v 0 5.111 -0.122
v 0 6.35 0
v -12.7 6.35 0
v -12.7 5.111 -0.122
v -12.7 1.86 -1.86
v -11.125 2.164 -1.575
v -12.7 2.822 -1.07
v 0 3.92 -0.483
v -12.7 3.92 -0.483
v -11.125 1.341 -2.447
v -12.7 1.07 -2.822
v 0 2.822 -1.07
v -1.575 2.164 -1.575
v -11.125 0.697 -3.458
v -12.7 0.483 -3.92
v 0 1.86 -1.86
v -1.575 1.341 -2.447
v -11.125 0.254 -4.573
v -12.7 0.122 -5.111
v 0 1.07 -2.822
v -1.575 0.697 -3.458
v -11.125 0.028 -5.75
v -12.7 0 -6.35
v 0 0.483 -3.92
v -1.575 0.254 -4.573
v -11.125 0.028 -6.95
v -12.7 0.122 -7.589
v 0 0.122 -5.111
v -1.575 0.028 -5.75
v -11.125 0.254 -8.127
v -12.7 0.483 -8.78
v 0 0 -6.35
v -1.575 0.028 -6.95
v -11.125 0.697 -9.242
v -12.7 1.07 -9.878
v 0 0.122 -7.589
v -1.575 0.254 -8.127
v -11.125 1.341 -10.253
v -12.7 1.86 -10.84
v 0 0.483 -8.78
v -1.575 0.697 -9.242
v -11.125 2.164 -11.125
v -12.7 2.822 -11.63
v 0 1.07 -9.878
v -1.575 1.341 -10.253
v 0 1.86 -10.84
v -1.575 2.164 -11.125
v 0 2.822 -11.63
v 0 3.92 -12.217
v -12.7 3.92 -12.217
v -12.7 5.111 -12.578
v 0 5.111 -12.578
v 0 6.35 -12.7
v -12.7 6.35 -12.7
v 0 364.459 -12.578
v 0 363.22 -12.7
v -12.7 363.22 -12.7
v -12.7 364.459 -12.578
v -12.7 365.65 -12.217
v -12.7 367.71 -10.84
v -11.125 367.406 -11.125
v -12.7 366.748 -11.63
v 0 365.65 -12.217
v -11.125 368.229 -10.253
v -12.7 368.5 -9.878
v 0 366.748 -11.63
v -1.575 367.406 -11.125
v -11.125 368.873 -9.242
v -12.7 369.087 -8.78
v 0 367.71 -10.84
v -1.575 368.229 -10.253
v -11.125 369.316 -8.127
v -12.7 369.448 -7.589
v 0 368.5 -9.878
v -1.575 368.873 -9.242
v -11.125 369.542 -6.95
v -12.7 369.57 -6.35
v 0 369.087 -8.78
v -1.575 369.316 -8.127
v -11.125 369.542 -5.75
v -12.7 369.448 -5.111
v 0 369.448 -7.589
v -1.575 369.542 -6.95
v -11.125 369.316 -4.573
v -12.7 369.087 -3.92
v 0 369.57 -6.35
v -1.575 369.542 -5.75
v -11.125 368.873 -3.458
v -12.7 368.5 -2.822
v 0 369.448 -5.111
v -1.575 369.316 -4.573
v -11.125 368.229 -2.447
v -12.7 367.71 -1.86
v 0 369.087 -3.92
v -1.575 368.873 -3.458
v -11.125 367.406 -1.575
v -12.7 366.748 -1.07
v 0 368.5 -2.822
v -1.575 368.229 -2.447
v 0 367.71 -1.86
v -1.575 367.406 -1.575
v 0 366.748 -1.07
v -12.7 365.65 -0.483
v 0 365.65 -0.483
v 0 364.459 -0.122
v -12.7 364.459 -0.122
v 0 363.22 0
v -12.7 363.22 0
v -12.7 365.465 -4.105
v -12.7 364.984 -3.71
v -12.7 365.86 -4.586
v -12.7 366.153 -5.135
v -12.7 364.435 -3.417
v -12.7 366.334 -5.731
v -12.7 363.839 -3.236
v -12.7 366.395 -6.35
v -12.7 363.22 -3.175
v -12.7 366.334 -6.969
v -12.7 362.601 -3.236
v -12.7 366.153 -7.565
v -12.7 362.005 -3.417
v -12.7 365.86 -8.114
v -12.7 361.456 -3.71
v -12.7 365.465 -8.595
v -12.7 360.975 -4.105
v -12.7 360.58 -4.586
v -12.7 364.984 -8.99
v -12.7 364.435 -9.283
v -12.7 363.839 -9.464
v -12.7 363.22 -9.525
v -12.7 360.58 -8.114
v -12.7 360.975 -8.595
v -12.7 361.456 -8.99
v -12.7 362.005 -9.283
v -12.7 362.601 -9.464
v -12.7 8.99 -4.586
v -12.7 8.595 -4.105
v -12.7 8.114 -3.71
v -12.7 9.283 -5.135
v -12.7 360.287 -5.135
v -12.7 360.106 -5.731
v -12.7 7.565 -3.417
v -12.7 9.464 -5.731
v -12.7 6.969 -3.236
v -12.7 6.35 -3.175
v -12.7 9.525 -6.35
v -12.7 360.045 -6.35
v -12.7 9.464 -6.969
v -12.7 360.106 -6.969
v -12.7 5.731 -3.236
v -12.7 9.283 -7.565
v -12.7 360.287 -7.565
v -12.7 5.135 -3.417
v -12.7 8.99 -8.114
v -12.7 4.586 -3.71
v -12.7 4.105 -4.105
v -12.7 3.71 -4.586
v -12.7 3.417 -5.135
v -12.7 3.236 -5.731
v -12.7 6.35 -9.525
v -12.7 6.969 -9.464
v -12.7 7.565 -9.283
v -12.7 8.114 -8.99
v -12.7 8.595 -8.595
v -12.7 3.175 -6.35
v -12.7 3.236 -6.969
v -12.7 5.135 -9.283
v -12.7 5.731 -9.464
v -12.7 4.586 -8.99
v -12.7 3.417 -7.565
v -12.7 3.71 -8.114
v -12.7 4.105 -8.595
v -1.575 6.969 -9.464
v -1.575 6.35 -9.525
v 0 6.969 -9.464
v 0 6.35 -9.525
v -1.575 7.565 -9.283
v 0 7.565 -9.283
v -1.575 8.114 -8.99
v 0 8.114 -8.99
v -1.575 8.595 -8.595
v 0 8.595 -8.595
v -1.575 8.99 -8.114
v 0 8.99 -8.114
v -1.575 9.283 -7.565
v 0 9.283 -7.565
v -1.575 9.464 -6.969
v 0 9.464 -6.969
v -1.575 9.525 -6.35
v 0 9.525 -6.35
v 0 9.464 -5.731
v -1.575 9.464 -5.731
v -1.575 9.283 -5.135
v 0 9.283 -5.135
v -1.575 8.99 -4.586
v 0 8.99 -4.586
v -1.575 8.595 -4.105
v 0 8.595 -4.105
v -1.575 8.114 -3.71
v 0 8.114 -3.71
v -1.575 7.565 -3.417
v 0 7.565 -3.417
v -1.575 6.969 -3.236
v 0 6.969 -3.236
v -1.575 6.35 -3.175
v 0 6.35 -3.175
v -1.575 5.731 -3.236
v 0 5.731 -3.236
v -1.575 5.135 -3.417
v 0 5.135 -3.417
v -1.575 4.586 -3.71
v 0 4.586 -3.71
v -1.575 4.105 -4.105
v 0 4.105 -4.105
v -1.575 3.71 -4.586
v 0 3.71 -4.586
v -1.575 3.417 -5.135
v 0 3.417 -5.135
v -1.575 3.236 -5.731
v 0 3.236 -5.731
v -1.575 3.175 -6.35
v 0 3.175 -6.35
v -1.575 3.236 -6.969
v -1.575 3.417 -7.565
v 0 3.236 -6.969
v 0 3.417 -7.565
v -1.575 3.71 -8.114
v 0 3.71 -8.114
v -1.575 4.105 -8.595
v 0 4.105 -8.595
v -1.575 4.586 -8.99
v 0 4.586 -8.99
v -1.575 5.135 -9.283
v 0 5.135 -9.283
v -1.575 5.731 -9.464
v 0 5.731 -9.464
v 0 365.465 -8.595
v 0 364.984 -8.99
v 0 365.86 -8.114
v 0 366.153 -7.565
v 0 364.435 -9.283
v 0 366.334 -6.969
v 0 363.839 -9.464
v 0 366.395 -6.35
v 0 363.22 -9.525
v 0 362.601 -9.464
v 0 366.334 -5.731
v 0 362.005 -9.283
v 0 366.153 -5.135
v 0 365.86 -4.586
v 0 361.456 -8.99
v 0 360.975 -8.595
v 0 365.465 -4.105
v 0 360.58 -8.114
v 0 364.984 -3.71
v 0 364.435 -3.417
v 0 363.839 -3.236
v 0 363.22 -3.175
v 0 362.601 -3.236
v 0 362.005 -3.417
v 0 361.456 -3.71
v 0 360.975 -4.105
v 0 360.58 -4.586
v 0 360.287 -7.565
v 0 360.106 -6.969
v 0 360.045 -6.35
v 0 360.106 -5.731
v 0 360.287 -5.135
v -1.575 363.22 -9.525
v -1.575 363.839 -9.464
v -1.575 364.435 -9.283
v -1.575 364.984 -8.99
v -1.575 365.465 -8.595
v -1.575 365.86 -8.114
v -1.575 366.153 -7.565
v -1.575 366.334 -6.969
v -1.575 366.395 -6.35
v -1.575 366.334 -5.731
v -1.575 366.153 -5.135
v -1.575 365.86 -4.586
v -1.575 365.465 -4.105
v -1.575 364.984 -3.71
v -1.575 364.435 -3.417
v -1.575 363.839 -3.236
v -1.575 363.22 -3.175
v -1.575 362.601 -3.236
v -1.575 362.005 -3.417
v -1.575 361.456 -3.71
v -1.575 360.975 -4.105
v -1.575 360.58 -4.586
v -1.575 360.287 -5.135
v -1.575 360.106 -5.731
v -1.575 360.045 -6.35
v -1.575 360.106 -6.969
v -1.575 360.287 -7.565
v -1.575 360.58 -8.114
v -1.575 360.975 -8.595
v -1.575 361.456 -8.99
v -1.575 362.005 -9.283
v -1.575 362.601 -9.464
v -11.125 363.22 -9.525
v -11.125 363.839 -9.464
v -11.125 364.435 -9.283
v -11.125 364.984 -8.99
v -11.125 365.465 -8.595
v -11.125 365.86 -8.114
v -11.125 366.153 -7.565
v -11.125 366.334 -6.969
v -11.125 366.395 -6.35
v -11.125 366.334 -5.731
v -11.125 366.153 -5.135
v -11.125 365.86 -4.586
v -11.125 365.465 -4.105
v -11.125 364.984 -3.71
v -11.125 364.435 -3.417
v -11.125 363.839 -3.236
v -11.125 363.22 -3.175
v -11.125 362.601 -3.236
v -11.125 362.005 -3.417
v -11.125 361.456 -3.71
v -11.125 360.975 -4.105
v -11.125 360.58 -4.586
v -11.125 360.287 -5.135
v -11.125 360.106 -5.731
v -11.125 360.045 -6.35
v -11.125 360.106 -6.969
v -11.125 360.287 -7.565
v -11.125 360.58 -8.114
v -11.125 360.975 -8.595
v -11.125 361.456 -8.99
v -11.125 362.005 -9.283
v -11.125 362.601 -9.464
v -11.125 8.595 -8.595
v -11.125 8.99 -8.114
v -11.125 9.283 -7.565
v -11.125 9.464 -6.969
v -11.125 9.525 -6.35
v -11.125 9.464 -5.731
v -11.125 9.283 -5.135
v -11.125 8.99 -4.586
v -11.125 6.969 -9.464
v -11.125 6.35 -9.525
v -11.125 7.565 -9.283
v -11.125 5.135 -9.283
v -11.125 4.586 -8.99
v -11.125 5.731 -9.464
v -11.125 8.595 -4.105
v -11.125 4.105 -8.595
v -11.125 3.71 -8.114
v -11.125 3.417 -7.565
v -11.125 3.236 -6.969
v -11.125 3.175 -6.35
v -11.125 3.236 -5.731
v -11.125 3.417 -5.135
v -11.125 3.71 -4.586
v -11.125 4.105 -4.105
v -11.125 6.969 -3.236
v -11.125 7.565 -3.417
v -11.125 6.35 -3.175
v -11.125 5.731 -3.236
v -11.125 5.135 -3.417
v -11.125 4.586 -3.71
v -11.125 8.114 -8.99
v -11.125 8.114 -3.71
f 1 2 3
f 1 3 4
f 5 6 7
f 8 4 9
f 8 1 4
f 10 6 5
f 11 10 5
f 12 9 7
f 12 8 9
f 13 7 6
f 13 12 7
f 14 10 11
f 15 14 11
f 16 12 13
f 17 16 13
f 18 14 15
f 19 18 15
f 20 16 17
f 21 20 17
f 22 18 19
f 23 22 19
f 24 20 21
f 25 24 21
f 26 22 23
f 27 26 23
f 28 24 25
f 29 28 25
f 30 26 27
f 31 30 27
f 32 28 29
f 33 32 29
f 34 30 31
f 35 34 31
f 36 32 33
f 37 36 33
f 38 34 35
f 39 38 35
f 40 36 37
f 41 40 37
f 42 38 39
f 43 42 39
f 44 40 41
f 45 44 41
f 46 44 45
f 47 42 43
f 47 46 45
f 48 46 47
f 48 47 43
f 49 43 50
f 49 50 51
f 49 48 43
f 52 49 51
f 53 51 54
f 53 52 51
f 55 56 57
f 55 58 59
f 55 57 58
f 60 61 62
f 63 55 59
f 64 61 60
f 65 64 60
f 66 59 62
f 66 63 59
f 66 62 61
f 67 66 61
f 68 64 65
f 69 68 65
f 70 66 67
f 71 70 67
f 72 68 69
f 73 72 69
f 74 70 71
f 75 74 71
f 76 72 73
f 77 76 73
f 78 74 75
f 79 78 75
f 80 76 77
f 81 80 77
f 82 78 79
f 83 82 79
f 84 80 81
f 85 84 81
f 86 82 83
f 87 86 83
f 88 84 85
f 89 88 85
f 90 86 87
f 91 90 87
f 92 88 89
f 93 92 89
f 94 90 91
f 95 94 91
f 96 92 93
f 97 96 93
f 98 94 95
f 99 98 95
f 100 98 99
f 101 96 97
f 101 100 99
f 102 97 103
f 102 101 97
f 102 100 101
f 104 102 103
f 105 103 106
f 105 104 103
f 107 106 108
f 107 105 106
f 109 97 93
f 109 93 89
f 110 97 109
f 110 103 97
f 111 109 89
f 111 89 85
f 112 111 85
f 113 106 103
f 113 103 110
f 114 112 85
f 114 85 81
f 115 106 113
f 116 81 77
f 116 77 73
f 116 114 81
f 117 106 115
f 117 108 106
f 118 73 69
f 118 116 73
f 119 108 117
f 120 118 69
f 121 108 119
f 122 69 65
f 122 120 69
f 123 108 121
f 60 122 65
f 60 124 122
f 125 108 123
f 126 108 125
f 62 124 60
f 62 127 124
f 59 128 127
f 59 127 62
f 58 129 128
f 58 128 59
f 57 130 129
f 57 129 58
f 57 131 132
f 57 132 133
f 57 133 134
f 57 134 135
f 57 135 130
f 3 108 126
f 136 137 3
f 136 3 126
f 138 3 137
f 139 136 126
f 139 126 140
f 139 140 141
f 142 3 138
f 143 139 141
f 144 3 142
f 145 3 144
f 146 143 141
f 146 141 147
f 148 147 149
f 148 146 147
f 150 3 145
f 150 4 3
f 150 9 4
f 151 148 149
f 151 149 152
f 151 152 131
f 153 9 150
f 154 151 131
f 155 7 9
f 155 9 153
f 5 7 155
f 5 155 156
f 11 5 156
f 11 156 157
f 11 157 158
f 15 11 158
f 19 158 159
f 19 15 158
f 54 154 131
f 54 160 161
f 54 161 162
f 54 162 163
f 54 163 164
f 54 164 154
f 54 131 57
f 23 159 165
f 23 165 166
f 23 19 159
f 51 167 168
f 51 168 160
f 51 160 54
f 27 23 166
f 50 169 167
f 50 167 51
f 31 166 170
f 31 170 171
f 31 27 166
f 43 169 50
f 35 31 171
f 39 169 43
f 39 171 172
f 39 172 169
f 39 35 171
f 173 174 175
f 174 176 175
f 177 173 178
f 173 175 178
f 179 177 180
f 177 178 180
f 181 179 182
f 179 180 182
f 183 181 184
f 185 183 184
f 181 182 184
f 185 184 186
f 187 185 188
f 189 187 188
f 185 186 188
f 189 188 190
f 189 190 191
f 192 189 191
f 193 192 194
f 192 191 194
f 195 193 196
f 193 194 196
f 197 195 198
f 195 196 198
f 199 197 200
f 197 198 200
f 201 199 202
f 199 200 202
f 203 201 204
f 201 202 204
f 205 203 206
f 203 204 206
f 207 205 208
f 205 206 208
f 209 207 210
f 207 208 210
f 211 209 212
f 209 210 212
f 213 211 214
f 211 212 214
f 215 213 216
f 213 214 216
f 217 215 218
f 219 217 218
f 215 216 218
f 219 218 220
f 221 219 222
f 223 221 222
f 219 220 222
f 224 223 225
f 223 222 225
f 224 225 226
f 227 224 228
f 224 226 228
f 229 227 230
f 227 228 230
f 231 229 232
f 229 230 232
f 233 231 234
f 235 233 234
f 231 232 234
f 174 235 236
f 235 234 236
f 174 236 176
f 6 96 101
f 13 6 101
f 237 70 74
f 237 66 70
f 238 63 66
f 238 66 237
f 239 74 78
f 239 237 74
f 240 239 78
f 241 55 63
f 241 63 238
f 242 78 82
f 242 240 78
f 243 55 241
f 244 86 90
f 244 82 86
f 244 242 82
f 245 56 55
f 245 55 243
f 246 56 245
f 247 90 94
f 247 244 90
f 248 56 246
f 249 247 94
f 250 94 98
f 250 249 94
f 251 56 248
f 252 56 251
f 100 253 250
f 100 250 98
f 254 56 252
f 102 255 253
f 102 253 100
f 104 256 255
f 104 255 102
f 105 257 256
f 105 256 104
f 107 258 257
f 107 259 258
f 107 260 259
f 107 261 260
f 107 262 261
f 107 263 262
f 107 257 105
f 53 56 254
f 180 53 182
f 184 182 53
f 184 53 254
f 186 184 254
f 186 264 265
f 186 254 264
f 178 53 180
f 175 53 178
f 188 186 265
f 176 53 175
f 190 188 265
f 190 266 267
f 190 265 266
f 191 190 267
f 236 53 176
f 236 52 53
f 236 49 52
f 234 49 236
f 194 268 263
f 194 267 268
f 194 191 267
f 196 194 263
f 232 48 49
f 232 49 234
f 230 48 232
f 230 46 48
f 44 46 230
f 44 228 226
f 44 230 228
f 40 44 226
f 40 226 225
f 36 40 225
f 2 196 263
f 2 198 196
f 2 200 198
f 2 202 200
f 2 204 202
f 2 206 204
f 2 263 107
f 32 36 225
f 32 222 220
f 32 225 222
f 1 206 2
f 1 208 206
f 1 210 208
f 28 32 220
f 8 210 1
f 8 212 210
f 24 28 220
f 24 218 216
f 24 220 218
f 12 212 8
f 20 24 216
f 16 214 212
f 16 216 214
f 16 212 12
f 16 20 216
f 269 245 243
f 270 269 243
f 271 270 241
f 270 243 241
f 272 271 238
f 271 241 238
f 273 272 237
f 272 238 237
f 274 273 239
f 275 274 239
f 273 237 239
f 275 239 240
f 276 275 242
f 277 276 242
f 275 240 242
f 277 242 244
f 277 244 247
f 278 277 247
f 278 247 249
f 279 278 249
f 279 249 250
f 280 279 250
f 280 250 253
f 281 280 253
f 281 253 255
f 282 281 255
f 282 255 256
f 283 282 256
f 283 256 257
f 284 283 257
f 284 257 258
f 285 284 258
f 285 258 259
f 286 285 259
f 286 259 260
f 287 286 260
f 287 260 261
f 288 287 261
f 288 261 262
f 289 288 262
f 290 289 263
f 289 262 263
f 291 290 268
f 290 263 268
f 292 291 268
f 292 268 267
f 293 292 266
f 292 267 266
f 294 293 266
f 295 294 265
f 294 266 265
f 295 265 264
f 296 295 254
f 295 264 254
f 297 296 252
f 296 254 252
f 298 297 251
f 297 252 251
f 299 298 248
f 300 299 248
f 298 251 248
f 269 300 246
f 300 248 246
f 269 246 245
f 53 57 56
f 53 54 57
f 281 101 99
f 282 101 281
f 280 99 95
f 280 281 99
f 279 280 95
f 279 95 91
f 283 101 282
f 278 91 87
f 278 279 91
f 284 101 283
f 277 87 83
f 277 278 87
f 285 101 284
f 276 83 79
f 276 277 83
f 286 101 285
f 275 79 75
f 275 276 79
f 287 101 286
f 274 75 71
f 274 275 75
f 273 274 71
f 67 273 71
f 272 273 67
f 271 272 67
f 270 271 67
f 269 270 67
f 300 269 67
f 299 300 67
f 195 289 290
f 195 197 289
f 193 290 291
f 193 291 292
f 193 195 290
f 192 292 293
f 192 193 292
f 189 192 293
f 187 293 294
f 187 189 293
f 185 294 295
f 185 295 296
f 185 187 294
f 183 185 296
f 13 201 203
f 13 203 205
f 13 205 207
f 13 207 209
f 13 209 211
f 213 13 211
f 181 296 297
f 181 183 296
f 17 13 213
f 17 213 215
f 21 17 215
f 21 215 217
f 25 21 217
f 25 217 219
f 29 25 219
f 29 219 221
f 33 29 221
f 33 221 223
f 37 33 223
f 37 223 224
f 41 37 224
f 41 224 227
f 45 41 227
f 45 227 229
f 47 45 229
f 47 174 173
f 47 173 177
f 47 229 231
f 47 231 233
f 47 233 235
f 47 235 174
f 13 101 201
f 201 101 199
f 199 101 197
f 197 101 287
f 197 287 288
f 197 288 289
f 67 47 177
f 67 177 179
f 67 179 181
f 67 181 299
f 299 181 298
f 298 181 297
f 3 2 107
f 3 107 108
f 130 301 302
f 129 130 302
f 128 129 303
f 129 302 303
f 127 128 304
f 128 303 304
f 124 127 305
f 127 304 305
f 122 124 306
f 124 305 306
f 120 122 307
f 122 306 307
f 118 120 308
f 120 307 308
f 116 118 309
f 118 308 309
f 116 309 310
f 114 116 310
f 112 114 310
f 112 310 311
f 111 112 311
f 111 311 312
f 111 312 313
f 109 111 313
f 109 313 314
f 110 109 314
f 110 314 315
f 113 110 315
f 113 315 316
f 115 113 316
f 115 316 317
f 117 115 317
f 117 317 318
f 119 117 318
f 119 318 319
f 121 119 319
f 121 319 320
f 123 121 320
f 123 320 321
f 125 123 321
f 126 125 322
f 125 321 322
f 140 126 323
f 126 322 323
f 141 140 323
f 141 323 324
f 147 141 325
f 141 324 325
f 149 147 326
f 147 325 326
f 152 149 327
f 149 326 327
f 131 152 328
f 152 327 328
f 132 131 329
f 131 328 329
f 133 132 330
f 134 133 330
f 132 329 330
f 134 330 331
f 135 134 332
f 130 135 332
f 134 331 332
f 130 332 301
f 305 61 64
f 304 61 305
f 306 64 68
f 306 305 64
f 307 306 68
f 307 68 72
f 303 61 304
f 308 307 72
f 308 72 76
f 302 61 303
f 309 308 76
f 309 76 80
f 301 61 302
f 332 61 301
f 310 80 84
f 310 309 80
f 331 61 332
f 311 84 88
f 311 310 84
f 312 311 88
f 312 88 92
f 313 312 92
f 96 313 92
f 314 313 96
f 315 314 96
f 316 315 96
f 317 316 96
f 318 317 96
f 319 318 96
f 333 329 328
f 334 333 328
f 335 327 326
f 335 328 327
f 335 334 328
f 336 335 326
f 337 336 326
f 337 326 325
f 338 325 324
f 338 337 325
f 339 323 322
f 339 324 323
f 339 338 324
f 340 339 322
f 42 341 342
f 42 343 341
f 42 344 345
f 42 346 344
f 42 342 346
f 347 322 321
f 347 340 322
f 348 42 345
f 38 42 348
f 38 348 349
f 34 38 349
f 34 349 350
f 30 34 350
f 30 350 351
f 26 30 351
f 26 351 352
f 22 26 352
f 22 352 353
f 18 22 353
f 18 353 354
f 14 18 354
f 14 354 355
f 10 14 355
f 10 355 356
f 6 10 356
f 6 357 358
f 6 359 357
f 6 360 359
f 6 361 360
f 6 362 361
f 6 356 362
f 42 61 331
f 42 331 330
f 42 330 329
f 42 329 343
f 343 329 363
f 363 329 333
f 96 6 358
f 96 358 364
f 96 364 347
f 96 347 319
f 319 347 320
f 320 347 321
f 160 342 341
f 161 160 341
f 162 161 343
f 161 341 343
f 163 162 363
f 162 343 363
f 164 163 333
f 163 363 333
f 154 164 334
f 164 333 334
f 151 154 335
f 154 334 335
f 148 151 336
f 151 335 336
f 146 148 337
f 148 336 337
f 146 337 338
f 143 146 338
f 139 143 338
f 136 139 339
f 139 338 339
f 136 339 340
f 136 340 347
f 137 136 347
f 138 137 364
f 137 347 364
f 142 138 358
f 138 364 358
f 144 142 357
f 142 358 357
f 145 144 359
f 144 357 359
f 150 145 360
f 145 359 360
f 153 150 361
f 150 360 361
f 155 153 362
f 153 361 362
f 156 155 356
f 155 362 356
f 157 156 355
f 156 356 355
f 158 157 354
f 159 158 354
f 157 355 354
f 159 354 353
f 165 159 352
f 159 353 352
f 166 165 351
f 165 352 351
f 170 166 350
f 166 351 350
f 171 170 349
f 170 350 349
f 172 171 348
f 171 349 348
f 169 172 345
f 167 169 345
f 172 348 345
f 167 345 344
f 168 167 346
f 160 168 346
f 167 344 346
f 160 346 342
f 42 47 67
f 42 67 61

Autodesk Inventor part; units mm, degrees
ref_plane "YZ Plane" through (0, 0, 0) normal (1, 0, 0) x (0, 1, 0)
ref_plane "XZ Plane" through (0, 0, 0) normal (0, 1, 0) x (-1, 0, 0)
ref_plane "XY Plane" through (0, 0, 0) normal (0, 0, 1) x (1, 0, 0)
sketch "Sketch1" plane through (0, 0, 0) normal (0, 1, 0) x (-1, 0, 0)
  line L0 (0, 0) -> (12.7, 0)
  line L1 (12.7, 0) -> (12.7, -12.7)
  line L2 (12.7, -12.7) -> (0, -12.7)
  line L3 (0, -12.7) -> (0, 0)
  line L4 (11.1252, -1.5748) -> (1.5748, -1.5748)
  line L5 (1.5748, -1.5748) -> (1.5748, -11.1252)
  line L6 (1.5748, -11.1252) -> (11.1252, -11.1252)
  line L7 (11.1252, -11.1252) -> (11.1252, -1.5748)
  line L8 (6.35, -1.5748) -> (6.35, 0) construction
  line L9 (1.5748, -6.35) -> (0, -6.35) construction
  dimension "d0" = 12.7
  dimension "d1" = 1.5748
extrude "Extrusion1" add sketch "Sketch1" along normal blind 369.57
sketch "Sketch2" plane through (0, 0, 0) normal (1, 0, 0) x (0, 0, -1)
  line L0 (0, 0) -> (12.7, 0) construction
  line L1 (6.35, 0) -> (6.35, 369.57) construction
  line L2 (0, 369.57) -> (12.7, 369.57) construction
  line L3 (0, 0) -> (0, 369.57) construction
  line L4 (0, 184.785) -> (12.7, 184.785) construction
  circle A0 centre (6.35, 6.35) radius 3.175
  circle A1 centre (6.35, 363.22) radius 3.175
  dimension "d4" = 6.35
  dimension "d5" = 356.87
extrude "Extrusion2" cut sketch "Sketch2" against normal through all
fillet "Fillet1" radius 6.35 4 edges at (-6.35, 369.57, 0) (-6.35, 369.57, -12.7) (-6.35, 0, 0) (-6.35, 0, -12.7)
properties part number "Tie Rod"
